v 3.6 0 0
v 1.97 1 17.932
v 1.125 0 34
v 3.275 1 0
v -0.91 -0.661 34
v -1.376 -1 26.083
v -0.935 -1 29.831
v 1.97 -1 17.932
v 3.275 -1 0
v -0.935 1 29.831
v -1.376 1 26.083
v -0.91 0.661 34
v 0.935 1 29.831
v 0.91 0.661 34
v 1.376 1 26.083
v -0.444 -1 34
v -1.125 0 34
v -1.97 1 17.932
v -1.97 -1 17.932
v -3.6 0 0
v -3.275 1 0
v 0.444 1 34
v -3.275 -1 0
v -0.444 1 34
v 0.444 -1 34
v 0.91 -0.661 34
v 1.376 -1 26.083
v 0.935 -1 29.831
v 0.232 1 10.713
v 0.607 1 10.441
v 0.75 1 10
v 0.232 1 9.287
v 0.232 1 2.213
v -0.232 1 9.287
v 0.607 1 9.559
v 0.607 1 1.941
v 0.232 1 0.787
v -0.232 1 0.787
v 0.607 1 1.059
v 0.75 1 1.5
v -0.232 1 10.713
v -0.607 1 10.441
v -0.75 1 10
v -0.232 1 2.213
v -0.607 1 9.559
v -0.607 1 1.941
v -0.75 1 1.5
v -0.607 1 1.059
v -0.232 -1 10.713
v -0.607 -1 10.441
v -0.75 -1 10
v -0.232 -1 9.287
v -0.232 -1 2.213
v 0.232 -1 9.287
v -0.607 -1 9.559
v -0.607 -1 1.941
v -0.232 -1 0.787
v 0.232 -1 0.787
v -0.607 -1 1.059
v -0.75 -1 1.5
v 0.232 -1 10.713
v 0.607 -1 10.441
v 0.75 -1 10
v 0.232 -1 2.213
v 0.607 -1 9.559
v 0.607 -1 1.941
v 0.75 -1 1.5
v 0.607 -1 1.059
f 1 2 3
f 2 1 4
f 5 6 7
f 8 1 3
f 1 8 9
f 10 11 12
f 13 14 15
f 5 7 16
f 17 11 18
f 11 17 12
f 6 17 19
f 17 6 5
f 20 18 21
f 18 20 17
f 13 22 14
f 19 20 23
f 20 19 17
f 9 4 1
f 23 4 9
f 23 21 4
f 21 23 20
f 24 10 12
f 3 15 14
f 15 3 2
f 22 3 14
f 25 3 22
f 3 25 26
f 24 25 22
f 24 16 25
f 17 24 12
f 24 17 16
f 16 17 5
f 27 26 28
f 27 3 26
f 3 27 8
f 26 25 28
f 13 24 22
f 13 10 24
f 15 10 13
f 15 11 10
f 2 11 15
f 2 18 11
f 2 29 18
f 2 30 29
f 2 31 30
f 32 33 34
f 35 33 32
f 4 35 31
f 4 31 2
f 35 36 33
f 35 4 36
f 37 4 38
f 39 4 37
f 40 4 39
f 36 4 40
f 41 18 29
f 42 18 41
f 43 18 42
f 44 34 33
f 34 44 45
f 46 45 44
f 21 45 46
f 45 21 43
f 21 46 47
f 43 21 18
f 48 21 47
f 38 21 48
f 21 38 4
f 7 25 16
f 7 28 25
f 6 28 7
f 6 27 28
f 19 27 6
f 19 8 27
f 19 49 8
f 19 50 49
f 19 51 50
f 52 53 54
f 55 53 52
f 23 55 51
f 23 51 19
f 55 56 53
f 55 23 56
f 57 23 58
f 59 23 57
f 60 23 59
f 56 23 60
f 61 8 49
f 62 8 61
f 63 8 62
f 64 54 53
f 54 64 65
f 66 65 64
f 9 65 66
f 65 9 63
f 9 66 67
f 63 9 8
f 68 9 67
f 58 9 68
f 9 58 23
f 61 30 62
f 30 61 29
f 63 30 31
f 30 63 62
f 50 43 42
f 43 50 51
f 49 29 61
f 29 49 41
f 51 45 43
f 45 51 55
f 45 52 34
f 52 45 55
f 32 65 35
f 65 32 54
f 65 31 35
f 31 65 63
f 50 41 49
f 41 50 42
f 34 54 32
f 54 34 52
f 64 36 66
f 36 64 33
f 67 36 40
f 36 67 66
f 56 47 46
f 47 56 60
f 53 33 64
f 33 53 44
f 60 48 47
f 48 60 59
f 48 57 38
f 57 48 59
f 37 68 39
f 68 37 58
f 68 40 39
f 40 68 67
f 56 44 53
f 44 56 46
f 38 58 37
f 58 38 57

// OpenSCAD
//IFixit plastic tipped tweezer replacement tips, and notes.
difference(){
difference(){
difference(){

difference(){
cylinder(34,3.6,1.125);
translate([-7,1,0])
cube([15,15,35]);
}

translate([-7,-16,0])
cube([15,15,35]);
}

// AT 1.5MM theres a hole in the center, and at 10mm holes are ~0.75mm radius
// An ubutment ridge is 14mm up from base.
// OK I fixxed it.
$fn=10;
translate([0,1.5,10.0])
rotate([90,0,0]) cylinder(3,0.75,0.75);
}
$fn=10;
translate([0,1.5,1.5])
#rotate([90,0,0]) cylinder(3,0.75,0.75);
}
//// the ubutment piece...
//difference(){
//cylinder(34,3.6,2.25);
//translate([-7,1,0])
//cube([15,15,35]);
//}
